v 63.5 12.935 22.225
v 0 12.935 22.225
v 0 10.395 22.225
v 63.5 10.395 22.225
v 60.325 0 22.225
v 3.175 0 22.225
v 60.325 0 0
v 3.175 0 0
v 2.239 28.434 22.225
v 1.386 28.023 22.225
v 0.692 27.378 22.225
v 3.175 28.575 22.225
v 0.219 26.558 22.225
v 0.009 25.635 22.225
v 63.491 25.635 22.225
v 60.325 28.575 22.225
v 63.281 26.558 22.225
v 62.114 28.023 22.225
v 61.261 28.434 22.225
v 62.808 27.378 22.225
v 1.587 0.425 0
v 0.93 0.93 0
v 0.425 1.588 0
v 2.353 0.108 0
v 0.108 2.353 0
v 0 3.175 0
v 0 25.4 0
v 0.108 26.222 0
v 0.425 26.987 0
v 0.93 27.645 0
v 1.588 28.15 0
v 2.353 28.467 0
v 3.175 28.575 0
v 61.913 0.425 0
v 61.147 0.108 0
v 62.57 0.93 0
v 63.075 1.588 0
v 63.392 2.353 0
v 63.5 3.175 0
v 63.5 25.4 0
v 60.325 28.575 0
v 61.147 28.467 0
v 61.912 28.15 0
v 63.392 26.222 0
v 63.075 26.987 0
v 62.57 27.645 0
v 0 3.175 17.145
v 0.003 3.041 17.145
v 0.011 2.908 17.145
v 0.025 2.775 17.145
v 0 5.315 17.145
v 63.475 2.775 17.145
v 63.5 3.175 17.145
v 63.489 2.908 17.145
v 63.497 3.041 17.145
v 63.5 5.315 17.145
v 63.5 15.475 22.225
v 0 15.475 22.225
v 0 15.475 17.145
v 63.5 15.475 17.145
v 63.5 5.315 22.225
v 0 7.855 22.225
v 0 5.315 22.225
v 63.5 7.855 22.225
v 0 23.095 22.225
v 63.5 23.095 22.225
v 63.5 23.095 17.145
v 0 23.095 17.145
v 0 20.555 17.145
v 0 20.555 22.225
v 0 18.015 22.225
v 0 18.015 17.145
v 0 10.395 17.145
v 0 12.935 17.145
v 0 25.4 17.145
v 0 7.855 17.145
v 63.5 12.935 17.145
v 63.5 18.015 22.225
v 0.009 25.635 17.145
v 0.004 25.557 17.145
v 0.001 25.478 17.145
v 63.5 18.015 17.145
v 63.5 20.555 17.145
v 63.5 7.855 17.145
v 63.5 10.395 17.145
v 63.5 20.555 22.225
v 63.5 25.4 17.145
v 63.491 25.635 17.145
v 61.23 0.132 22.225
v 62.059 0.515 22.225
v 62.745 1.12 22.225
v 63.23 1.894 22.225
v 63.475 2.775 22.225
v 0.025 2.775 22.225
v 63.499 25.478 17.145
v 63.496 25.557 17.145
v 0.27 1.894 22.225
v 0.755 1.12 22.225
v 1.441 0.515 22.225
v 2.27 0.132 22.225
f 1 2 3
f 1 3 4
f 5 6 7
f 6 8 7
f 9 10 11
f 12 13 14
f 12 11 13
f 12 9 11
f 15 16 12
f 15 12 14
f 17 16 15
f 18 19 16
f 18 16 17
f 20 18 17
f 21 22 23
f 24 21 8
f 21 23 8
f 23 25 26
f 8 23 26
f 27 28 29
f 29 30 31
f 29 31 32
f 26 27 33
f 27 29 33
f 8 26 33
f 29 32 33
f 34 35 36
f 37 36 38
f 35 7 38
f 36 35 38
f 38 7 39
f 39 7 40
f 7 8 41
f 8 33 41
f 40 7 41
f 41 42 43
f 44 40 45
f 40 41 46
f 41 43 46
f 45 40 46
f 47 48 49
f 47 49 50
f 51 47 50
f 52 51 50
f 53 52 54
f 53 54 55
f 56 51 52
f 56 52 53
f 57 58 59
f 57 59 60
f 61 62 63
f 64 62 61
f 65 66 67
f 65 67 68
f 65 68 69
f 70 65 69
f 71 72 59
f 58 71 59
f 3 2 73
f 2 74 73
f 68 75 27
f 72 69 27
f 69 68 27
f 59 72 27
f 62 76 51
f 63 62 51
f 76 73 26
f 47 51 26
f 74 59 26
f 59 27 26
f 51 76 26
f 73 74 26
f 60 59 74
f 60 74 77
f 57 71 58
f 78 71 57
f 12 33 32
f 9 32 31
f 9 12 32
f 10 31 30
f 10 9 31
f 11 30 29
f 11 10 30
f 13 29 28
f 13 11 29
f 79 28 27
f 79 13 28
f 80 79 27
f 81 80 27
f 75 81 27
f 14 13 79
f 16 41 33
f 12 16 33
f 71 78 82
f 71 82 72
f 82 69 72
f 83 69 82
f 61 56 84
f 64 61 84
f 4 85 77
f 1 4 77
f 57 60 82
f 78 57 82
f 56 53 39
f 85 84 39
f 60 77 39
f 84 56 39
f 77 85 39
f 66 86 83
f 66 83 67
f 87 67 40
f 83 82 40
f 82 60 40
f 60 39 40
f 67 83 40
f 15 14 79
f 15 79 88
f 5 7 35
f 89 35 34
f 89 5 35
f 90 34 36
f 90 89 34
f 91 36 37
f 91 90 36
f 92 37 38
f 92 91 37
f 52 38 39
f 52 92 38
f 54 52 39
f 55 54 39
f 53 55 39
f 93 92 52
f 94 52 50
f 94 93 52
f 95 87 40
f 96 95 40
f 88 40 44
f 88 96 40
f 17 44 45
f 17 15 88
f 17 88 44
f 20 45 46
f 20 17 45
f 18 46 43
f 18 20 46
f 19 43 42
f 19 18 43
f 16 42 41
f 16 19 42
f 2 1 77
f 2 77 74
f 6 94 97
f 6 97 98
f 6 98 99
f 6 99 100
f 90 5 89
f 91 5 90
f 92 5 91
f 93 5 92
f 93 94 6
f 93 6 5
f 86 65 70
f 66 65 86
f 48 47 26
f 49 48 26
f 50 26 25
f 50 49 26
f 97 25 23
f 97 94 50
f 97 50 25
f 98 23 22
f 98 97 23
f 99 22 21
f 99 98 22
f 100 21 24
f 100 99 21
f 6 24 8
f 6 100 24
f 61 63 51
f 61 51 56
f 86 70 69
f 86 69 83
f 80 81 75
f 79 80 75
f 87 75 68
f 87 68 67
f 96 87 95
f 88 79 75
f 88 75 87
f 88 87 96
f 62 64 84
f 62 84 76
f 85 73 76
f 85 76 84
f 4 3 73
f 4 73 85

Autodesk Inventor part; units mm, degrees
ref_plane "YZ Plane" through (0, 0, 0) normal (1, 0, 0) x (0, 1, 0)
ref_plane "XZ Plane" through (0, 0, 0) normal (0, 1, 0) x (-1, 0, 0)
ref_plane "XY Plane" through (0, 0, 0) normal (0, 0, 1) x (1, 0, 0)
sketch "Sketch1" plane through (0, 0, 0) normal (0, 0, 1) x (1, 0, 0)
  line L0 (0, 0) -> (63.5, 0)
  line L1 (63.5, 0) -> (63.5, 28.575)
  line L2 (63.5, 28.575) -> (0, 28.575)
  line L3 (0, 28.575) -> (0, 0)
  dimension "d0" = 63.5
  dimension "d1" = 28.575
extrude "Extrusion1" add sketch "Sketch1" along normal blind 22.225
fillet "Fillet1" radius 3.175 4 edges at (63.5, 28.575, 11.1125) (63.5, 0, 11.1125) (0, 0, 11.1125) (0, 28.575, 11.1125)
sketch "Sketch2" plane through (0, 0, 22.225) normal (0, 0, 1) x (1, 0, 0)
  line L0 (63.5, 3.175) -> (63.5, 25.4) projected
  line L1 (0, 25.6349) -> (63.5, 25.6349)
  line L2 (63.5, 25.6349) -> (63.5, 23.0949)
  line L3 (63.5, 23.0949) -> (0, 23.0949)
  line L4 (0, 23.0949) -> (0, 25.6349)
  line L5 (0, 20.5549) -> (63.5, 20.5549)
  line L6 (63.5, 20.5549) -> (63.5, 18.0149)
  line L7 (63.5, 18.0149) -> (0, 18.0149)
  line L8 (0, 18.0149) -> (0, 20.5549)
  line L9 (0, 15.4749) -> (63.5, 15.4749)
  line L10 (63.5, 15.4749) -> (63.5, 12.9349)
  line L11 (63.5, 12.9349) -> (0, 12.9349)
  line L12 (0, 12.9349) -> (0, 15.4749)
  line L13 (0, 10.3949) -> (63.5, 10.3949)
  line L14 (63.5, 10.3949) -> (63.5, 7.8549)
  line L15 (63.5, 7.8549) -> (0, 7.8549)
  line L16 (0, 7.8549) -> (0, 10.3949)
  line L17 (0, 5.3149) -> (63.5, 5.3149)
  line L18 (63.5, 5.3149) -> (63.5, 2.7749)
  line L19 (63.5, 2.7749) -> (0, 2.7749)
  line L20 (0, 2.7749) -> (0, 5.3149)
  point P0 (0, 0)
  dimension "d5" = 2.54
  dimension "d8" = 5.08
extrude "Extrusion2" cut sketch "Sketch2" against normal blind 5.08
properties part number "Victor"
